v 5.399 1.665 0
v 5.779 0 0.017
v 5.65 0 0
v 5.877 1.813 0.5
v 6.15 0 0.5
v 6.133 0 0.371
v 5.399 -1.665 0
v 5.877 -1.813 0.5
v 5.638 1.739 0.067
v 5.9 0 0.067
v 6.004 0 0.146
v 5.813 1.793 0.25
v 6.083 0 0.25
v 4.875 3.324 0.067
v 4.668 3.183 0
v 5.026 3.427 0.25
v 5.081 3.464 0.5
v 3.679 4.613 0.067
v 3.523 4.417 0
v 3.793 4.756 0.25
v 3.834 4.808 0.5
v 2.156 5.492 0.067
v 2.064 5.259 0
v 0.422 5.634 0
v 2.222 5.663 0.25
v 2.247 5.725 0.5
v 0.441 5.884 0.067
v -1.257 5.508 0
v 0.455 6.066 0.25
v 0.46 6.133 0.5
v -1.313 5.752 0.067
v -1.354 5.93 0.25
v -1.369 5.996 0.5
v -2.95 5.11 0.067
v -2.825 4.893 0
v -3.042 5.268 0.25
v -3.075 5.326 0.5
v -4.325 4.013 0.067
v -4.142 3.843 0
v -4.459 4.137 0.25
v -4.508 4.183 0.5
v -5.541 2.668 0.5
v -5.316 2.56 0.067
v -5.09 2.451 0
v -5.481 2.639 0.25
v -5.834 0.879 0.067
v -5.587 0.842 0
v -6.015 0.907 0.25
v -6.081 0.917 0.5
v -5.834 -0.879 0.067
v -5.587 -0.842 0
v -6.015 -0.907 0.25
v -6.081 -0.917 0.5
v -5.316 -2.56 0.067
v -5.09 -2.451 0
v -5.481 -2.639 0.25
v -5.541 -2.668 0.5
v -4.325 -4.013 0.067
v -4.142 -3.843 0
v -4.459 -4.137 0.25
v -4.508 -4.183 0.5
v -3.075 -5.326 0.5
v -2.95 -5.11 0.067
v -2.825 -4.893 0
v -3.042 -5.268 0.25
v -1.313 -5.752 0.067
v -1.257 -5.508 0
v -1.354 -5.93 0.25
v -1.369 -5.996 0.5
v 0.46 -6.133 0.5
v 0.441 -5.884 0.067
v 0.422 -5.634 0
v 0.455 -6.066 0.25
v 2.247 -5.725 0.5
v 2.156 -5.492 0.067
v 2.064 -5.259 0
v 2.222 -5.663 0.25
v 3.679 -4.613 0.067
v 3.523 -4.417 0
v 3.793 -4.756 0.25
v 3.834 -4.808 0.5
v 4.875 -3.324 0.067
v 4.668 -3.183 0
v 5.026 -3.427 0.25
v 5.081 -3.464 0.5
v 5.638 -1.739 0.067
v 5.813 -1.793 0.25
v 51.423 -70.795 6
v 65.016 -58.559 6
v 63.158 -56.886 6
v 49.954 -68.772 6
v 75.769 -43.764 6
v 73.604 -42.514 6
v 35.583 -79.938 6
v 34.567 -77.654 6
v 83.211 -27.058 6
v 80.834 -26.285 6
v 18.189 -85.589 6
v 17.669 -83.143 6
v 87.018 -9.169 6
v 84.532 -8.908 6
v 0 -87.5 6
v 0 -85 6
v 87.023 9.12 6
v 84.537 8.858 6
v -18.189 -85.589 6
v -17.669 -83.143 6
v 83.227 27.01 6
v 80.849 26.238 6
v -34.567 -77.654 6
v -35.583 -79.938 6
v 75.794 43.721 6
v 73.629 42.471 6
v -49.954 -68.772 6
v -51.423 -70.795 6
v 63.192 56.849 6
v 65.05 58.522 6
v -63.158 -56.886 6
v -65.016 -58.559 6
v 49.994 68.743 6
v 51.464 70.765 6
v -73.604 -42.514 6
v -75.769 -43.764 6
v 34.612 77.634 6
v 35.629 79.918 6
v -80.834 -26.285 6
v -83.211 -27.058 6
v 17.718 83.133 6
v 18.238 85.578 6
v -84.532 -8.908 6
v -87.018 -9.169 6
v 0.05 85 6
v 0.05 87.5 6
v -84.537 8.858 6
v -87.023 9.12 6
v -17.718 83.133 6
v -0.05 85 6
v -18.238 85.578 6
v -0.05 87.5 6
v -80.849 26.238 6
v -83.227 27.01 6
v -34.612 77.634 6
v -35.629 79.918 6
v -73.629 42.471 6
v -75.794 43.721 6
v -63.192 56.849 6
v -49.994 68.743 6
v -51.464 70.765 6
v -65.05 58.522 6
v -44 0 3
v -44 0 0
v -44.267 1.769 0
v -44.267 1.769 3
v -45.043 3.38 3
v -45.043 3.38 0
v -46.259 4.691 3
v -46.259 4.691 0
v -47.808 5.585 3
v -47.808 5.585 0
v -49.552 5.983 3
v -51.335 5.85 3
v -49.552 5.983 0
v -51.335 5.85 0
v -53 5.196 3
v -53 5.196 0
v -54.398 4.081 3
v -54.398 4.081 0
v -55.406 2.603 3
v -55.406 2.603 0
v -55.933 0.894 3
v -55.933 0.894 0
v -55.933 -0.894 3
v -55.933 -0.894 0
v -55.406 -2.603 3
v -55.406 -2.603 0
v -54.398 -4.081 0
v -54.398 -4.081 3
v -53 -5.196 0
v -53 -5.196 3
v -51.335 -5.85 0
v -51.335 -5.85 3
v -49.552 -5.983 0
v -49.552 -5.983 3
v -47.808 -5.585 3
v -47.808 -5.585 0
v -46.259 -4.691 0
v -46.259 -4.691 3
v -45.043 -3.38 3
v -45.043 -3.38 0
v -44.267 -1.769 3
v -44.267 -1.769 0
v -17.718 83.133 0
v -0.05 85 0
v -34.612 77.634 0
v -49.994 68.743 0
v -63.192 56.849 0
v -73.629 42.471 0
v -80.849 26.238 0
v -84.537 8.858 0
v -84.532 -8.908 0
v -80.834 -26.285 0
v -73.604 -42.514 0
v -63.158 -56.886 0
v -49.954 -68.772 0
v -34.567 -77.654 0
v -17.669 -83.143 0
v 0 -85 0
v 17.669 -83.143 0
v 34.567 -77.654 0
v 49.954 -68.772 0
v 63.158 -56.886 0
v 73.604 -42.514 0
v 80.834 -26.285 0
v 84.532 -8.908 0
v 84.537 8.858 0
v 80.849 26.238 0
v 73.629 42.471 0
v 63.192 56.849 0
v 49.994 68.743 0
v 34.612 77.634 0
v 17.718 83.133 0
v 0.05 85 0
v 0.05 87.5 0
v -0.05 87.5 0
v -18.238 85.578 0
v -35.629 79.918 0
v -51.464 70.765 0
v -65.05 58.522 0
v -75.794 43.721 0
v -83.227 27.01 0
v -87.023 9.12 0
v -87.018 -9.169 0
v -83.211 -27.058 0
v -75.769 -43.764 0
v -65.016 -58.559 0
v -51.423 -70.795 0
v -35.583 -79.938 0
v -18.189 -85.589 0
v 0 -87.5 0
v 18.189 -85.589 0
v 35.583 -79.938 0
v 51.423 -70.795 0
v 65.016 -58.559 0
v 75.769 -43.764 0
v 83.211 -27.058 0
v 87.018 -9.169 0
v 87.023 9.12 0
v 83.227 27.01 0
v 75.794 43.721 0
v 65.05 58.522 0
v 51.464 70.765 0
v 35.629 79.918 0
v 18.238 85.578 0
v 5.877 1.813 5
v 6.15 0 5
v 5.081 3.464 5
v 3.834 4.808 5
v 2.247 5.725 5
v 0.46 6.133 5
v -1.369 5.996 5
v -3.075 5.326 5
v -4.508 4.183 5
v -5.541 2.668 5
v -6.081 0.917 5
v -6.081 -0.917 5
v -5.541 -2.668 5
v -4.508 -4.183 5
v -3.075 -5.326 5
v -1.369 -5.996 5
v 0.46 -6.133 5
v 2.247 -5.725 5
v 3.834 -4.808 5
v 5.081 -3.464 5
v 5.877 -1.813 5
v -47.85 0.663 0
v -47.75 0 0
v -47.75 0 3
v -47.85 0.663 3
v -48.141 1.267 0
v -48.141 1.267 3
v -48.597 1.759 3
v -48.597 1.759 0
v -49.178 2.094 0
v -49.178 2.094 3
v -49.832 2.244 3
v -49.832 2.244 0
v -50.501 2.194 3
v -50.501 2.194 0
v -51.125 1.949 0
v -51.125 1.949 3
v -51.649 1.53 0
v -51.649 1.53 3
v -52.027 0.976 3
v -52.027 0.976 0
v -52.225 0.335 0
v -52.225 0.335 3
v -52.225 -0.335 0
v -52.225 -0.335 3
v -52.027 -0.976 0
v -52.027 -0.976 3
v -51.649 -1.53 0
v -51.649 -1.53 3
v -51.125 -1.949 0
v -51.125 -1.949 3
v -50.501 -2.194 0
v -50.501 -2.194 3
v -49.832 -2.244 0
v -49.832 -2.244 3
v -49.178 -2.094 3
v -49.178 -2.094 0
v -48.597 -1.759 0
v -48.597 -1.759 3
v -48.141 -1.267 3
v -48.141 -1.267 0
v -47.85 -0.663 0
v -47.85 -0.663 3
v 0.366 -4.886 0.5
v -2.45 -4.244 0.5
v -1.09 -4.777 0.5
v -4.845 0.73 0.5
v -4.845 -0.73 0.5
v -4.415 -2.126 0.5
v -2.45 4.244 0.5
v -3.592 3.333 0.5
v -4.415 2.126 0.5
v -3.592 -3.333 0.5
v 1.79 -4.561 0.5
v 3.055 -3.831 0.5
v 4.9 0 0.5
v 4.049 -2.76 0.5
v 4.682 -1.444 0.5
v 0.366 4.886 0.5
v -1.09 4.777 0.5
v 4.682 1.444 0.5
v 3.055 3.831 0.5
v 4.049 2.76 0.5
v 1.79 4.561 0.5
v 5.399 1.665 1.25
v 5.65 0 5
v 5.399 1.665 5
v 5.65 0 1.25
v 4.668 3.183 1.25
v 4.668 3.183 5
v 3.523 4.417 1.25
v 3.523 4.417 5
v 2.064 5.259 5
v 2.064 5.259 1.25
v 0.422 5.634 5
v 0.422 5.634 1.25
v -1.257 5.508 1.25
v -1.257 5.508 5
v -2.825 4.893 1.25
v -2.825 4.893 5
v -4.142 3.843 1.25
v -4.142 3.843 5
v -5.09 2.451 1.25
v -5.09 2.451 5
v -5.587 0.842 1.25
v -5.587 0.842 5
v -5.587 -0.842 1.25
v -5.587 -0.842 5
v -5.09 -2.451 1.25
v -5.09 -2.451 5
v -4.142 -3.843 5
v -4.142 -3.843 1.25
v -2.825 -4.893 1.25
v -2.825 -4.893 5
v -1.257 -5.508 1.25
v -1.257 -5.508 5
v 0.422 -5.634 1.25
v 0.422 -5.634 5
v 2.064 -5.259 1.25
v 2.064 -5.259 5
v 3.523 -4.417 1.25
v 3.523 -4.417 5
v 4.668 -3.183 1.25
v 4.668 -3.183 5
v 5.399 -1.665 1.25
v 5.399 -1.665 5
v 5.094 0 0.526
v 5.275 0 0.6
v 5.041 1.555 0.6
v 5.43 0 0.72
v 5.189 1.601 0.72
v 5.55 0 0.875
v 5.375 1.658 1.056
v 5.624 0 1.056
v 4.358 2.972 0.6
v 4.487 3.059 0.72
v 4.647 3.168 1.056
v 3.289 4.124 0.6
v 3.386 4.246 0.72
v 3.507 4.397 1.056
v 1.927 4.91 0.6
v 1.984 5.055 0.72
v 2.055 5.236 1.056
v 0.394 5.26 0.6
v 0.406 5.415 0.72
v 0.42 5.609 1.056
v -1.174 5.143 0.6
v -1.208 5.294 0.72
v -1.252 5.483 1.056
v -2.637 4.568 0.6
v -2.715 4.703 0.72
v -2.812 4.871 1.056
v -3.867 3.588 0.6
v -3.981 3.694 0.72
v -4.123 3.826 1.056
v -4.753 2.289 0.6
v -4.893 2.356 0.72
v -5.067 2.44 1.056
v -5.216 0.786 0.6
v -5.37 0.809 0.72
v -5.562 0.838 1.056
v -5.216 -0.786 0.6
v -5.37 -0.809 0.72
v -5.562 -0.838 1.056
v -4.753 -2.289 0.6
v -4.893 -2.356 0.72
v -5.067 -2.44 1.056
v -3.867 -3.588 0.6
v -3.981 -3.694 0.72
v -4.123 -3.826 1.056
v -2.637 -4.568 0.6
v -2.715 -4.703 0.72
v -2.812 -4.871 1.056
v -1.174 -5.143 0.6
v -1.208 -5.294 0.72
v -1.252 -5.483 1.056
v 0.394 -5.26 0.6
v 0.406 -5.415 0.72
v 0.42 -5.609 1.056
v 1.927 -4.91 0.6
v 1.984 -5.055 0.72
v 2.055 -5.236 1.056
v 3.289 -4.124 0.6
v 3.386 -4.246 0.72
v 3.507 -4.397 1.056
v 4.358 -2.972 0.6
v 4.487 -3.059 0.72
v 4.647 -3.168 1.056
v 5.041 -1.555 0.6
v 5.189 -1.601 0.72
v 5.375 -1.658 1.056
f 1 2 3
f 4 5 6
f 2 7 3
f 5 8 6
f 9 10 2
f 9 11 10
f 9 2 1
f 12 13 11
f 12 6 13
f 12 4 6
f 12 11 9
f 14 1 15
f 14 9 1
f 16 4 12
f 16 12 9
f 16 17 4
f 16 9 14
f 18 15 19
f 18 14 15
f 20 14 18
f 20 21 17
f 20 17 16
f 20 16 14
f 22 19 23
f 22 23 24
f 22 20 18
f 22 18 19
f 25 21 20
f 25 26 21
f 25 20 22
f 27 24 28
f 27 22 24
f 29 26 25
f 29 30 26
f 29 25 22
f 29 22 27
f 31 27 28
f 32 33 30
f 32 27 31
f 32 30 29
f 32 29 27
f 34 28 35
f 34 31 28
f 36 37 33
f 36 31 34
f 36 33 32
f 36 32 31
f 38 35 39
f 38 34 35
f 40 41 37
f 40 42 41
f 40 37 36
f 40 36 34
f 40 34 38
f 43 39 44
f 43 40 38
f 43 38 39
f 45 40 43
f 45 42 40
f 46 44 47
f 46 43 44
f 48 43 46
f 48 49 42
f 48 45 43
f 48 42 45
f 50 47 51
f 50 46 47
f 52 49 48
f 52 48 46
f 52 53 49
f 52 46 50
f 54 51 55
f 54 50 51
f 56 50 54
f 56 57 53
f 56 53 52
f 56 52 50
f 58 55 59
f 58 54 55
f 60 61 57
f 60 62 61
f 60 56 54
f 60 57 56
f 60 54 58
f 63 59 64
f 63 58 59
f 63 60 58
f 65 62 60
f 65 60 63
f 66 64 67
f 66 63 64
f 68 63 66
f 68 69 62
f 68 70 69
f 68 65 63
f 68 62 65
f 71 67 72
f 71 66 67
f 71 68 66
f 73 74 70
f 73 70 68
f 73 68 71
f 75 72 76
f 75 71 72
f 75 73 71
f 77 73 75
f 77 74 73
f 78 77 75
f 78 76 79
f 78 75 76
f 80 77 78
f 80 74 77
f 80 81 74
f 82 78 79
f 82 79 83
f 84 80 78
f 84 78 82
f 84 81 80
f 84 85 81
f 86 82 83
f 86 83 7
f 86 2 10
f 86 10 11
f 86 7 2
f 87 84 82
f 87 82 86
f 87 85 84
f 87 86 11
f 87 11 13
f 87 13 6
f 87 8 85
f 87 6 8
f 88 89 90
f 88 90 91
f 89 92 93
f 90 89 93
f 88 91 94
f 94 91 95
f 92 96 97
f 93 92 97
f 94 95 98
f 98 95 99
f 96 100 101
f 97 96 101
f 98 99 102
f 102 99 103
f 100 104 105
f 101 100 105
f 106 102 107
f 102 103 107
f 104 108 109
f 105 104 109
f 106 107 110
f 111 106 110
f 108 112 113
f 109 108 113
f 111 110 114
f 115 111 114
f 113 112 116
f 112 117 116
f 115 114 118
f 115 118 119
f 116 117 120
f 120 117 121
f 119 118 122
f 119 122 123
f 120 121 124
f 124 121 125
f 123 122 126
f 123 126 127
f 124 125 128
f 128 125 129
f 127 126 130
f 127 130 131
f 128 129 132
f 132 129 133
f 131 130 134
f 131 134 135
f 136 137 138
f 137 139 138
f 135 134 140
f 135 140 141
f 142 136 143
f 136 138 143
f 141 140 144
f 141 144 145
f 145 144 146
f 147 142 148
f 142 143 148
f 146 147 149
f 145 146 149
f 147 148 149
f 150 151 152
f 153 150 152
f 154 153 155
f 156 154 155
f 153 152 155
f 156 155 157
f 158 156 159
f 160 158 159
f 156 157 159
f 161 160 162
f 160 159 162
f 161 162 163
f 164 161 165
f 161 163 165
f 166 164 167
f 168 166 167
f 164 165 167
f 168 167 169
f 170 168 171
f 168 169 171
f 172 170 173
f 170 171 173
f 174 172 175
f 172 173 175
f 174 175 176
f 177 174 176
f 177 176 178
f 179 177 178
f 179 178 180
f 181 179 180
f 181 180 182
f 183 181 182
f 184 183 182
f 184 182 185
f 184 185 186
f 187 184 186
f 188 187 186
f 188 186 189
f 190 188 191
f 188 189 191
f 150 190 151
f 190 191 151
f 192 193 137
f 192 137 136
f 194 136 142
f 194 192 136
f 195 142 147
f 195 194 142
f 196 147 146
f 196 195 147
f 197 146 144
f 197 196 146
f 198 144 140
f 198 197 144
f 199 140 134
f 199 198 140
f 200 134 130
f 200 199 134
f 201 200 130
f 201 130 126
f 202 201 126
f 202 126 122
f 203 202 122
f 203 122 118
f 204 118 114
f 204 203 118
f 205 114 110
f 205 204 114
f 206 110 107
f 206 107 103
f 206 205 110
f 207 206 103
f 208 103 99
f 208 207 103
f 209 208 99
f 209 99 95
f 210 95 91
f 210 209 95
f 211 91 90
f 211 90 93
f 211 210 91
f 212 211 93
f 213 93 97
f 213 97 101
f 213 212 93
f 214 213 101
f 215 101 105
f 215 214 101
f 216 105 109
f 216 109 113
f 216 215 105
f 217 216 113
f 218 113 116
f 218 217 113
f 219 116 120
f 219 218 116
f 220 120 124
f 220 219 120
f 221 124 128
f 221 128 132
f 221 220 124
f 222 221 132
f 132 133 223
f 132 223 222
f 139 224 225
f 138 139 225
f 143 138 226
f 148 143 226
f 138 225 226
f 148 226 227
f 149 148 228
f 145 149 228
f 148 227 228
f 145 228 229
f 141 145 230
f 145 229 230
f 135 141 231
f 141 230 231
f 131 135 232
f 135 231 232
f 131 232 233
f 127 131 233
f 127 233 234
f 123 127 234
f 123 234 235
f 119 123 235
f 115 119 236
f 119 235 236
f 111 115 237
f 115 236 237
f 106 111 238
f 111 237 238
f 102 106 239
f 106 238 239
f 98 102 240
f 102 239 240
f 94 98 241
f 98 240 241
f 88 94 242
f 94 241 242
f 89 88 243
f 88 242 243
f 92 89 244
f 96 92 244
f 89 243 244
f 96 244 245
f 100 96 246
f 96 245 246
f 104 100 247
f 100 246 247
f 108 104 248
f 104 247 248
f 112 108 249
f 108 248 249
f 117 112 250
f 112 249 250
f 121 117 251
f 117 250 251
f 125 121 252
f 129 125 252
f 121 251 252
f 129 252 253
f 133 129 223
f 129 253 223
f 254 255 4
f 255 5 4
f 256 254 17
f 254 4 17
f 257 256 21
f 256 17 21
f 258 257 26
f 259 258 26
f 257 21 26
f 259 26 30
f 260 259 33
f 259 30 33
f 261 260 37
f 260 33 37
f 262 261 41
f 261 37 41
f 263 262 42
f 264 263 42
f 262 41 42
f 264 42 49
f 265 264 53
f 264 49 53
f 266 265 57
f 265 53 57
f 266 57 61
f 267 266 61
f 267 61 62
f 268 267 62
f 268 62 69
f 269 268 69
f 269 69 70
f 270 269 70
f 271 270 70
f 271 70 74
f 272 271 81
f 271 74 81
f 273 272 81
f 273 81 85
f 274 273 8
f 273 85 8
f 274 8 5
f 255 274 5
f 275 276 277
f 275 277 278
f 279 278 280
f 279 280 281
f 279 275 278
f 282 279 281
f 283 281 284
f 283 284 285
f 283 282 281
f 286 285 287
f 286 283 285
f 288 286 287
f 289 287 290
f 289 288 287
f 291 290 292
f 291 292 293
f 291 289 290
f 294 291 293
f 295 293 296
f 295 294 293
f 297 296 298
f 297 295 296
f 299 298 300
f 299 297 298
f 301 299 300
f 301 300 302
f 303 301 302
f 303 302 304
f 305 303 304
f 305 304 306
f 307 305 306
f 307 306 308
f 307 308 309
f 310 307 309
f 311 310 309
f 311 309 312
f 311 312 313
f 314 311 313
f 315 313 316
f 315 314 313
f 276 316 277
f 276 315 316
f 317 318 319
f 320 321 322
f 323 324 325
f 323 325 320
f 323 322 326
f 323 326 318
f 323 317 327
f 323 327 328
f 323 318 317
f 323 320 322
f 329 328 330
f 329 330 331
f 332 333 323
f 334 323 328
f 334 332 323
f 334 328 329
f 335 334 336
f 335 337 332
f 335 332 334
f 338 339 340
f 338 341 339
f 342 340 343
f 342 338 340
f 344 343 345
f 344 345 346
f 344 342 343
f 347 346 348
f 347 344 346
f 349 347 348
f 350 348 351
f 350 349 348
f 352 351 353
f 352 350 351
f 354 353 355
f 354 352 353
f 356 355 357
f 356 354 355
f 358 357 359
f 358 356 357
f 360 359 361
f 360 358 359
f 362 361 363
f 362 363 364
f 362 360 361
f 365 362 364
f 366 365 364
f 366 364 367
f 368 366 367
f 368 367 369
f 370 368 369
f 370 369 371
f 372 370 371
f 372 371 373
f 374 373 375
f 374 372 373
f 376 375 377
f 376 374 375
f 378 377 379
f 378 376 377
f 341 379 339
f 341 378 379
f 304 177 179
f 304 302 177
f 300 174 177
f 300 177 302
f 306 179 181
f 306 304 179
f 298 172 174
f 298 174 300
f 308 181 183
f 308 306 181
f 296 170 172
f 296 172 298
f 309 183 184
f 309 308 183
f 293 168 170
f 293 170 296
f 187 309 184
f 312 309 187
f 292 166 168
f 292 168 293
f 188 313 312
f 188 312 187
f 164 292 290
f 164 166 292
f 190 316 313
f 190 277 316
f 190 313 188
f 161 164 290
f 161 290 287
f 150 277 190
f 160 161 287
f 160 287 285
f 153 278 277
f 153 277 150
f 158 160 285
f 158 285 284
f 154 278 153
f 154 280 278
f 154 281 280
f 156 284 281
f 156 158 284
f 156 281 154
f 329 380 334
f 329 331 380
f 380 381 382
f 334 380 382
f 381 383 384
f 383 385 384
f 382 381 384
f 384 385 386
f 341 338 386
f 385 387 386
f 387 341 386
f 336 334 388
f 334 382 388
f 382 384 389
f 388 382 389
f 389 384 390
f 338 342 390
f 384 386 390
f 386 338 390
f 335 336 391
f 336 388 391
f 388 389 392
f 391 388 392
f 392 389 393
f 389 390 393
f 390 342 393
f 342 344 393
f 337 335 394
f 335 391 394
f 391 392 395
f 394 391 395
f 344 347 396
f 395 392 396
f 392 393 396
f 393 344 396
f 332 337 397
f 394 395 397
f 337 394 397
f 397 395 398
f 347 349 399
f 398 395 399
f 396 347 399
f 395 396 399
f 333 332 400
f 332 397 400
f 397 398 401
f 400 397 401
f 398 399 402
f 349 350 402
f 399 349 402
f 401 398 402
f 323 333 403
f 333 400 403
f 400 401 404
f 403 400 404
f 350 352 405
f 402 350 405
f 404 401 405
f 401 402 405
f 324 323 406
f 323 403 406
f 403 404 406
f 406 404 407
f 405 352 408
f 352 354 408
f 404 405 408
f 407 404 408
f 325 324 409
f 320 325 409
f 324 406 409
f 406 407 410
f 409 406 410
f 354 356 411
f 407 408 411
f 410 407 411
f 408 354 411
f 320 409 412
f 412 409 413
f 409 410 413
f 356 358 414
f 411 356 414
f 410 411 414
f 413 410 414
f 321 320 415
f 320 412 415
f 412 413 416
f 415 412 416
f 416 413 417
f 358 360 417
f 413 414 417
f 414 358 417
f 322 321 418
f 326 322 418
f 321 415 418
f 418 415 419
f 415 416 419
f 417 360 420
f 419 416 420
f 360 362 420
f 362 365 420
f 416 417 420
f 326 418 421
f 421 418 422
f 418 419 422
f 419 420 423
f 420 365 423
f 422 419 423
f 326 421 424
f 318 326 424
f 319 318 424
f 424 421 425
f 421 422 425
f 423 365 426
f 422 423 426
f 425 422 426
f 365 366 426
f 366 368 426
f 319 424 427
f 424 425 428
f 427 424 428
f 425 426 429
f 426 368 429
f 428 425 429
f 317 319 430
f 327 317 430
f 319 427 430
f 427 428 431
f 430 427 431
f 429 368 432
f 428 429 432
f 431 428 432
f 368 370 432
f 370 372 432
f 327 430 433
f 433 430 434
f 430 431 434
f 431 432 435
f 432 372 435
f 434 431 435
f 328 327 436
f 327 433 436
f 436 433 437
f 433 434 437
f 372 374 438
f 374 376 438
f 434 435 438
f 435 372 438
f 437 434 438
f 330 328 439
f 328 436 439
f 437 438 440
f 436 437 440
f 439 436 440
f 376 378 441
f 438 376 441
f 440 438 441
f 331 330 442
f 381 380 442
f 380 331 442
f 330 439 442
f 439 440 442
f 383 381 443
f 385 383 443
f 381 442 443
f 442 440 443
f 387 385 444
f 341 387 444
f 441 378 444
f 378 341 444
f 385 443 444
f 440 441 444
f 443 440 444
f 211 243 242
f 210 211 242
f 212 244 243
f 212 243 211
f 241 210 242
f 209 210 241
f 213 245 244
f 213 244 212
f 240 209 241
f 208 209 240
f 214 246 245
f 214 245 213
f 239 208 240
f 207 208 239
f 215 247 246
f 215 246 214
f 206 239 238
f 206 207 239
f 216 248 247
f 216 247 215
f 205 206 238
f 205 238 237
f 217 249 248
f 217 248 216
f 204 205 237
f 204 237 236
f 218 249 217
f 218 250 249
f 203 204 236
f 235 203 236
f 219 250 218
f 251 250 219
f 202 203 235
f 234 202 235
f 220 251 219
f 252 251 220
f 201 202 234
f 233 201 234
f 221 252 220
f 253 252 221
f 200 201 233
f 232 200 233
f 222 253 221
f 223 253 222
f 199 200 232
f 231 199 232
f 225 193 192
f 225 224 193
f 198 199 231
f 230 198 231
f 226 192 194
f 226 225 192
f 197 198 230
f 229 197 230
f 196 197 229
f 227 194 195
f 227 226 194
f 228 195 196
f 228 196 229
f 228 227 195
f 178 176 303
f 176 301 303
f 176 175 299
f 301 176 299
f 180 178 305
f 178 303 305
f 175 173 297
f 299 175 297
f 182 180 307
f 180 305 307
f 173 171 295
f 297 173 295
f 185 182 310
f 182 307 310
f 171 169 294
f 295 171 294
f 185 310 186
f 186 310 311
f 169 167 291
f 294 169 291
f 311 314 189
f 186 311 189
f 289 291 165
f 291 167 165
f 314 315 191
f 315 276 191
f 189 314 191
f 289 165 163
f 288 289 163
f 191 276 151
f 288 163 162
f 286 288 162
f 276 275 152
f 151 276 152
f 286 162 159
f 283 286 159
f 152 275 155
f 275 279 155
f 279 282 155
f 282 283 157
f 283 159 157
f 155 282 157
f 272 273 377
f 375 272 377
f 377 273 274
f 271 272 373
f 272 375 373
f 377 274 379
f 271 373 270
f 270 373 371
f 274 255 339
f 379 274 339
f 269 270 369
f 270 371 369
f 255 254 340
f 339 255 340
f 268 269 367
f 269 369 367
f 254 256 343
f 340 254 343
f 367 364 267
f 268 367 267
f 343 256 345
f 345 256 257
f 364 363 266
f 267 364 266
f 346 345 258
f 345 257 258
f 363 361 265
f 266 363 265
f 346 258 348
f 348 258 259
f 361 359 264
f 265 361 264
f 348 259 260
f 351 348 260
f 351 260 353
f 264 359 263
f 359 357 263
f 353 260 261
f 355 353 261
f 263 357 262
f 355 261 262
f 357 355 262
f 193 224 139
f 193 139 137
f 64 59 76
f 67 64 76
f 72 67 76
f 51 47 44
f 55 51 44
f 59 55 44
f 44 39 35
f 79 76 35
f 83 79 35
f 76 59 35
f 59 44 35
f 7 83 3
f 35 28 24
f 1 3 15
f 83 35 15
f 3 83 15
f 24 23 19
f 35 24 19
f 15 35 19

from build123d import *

# Parameters (mm, degrees)
PAD_DEPTH     = 6
SKETCH001_R   = 6
SKETCH001_R_2 = 2.25
PAD001_DEPTH  = 3


with BuildPart() as body:
    # Sketch → Pad (new body)
    with BuildSketch(Plane.XY):
        with BuildLine():
            ThreePointArc((-0.05, 84.999985), (0, -85), (0.05, 84.999985))
            Line((0.05, 87.499985), (0.05, 84.999985))
            ThreePointArc((-0.05, 87.499985), (0, -87.5), (0.05, 87.499985))
            Line((-0.05, 87.499985), (-0.05, 84.999985))
        make_face()
    extrude(amount=PAD_DEPTH)


with BuildPart() as f_12x4_5x3_5_washer:
    # Sketch001 → Pad001 (new body)
    with BuildSketch(Plane.XY):
        Circle(SKETCH001_R)
        Circle(SKETCH001_R_2, mode=Mode.SUBTRACT)
    extrude(amount=PAD001_DEPTH)


with BuildPart() as f_12x4_5x3_5_washer_1:
    # Body001 placement: moved
    add(f_12x4_5x3_5_washer.part.moved(Location((-50, 0, 0))))


with BuildPart() as f_12mm_cap:
    # Sketch002 → Revolution (revolve)
    with BuildSketch(Plane.XZ):
        with BuildLine():
            Line((6.15, 5), (6.15, 0.5))
            ThreePointArc((5.65, 0), (6.003553, 0.146447), (6.15, 0.5))
            Line((5.65, 0), (0, 0))
            Line((0, 0), (0, 0.5))
            Line((4.9, 0.5), (0, 0.5))
            ThreePointArc((4.9, 0.5), (5.43033, 0.71967), (5.65, 1.25))
            Line((5.65, 5), (5.65, 1.25))
            Line((5.65, 5), (6.15, 5))
        make_face()
    revolve(axis=Axis((0, 0, 0), (0, 0, 1)))


solid = Compound([body.part, f_12x4_5x3_5_washer_1.part, f_12mm_cap.part])
